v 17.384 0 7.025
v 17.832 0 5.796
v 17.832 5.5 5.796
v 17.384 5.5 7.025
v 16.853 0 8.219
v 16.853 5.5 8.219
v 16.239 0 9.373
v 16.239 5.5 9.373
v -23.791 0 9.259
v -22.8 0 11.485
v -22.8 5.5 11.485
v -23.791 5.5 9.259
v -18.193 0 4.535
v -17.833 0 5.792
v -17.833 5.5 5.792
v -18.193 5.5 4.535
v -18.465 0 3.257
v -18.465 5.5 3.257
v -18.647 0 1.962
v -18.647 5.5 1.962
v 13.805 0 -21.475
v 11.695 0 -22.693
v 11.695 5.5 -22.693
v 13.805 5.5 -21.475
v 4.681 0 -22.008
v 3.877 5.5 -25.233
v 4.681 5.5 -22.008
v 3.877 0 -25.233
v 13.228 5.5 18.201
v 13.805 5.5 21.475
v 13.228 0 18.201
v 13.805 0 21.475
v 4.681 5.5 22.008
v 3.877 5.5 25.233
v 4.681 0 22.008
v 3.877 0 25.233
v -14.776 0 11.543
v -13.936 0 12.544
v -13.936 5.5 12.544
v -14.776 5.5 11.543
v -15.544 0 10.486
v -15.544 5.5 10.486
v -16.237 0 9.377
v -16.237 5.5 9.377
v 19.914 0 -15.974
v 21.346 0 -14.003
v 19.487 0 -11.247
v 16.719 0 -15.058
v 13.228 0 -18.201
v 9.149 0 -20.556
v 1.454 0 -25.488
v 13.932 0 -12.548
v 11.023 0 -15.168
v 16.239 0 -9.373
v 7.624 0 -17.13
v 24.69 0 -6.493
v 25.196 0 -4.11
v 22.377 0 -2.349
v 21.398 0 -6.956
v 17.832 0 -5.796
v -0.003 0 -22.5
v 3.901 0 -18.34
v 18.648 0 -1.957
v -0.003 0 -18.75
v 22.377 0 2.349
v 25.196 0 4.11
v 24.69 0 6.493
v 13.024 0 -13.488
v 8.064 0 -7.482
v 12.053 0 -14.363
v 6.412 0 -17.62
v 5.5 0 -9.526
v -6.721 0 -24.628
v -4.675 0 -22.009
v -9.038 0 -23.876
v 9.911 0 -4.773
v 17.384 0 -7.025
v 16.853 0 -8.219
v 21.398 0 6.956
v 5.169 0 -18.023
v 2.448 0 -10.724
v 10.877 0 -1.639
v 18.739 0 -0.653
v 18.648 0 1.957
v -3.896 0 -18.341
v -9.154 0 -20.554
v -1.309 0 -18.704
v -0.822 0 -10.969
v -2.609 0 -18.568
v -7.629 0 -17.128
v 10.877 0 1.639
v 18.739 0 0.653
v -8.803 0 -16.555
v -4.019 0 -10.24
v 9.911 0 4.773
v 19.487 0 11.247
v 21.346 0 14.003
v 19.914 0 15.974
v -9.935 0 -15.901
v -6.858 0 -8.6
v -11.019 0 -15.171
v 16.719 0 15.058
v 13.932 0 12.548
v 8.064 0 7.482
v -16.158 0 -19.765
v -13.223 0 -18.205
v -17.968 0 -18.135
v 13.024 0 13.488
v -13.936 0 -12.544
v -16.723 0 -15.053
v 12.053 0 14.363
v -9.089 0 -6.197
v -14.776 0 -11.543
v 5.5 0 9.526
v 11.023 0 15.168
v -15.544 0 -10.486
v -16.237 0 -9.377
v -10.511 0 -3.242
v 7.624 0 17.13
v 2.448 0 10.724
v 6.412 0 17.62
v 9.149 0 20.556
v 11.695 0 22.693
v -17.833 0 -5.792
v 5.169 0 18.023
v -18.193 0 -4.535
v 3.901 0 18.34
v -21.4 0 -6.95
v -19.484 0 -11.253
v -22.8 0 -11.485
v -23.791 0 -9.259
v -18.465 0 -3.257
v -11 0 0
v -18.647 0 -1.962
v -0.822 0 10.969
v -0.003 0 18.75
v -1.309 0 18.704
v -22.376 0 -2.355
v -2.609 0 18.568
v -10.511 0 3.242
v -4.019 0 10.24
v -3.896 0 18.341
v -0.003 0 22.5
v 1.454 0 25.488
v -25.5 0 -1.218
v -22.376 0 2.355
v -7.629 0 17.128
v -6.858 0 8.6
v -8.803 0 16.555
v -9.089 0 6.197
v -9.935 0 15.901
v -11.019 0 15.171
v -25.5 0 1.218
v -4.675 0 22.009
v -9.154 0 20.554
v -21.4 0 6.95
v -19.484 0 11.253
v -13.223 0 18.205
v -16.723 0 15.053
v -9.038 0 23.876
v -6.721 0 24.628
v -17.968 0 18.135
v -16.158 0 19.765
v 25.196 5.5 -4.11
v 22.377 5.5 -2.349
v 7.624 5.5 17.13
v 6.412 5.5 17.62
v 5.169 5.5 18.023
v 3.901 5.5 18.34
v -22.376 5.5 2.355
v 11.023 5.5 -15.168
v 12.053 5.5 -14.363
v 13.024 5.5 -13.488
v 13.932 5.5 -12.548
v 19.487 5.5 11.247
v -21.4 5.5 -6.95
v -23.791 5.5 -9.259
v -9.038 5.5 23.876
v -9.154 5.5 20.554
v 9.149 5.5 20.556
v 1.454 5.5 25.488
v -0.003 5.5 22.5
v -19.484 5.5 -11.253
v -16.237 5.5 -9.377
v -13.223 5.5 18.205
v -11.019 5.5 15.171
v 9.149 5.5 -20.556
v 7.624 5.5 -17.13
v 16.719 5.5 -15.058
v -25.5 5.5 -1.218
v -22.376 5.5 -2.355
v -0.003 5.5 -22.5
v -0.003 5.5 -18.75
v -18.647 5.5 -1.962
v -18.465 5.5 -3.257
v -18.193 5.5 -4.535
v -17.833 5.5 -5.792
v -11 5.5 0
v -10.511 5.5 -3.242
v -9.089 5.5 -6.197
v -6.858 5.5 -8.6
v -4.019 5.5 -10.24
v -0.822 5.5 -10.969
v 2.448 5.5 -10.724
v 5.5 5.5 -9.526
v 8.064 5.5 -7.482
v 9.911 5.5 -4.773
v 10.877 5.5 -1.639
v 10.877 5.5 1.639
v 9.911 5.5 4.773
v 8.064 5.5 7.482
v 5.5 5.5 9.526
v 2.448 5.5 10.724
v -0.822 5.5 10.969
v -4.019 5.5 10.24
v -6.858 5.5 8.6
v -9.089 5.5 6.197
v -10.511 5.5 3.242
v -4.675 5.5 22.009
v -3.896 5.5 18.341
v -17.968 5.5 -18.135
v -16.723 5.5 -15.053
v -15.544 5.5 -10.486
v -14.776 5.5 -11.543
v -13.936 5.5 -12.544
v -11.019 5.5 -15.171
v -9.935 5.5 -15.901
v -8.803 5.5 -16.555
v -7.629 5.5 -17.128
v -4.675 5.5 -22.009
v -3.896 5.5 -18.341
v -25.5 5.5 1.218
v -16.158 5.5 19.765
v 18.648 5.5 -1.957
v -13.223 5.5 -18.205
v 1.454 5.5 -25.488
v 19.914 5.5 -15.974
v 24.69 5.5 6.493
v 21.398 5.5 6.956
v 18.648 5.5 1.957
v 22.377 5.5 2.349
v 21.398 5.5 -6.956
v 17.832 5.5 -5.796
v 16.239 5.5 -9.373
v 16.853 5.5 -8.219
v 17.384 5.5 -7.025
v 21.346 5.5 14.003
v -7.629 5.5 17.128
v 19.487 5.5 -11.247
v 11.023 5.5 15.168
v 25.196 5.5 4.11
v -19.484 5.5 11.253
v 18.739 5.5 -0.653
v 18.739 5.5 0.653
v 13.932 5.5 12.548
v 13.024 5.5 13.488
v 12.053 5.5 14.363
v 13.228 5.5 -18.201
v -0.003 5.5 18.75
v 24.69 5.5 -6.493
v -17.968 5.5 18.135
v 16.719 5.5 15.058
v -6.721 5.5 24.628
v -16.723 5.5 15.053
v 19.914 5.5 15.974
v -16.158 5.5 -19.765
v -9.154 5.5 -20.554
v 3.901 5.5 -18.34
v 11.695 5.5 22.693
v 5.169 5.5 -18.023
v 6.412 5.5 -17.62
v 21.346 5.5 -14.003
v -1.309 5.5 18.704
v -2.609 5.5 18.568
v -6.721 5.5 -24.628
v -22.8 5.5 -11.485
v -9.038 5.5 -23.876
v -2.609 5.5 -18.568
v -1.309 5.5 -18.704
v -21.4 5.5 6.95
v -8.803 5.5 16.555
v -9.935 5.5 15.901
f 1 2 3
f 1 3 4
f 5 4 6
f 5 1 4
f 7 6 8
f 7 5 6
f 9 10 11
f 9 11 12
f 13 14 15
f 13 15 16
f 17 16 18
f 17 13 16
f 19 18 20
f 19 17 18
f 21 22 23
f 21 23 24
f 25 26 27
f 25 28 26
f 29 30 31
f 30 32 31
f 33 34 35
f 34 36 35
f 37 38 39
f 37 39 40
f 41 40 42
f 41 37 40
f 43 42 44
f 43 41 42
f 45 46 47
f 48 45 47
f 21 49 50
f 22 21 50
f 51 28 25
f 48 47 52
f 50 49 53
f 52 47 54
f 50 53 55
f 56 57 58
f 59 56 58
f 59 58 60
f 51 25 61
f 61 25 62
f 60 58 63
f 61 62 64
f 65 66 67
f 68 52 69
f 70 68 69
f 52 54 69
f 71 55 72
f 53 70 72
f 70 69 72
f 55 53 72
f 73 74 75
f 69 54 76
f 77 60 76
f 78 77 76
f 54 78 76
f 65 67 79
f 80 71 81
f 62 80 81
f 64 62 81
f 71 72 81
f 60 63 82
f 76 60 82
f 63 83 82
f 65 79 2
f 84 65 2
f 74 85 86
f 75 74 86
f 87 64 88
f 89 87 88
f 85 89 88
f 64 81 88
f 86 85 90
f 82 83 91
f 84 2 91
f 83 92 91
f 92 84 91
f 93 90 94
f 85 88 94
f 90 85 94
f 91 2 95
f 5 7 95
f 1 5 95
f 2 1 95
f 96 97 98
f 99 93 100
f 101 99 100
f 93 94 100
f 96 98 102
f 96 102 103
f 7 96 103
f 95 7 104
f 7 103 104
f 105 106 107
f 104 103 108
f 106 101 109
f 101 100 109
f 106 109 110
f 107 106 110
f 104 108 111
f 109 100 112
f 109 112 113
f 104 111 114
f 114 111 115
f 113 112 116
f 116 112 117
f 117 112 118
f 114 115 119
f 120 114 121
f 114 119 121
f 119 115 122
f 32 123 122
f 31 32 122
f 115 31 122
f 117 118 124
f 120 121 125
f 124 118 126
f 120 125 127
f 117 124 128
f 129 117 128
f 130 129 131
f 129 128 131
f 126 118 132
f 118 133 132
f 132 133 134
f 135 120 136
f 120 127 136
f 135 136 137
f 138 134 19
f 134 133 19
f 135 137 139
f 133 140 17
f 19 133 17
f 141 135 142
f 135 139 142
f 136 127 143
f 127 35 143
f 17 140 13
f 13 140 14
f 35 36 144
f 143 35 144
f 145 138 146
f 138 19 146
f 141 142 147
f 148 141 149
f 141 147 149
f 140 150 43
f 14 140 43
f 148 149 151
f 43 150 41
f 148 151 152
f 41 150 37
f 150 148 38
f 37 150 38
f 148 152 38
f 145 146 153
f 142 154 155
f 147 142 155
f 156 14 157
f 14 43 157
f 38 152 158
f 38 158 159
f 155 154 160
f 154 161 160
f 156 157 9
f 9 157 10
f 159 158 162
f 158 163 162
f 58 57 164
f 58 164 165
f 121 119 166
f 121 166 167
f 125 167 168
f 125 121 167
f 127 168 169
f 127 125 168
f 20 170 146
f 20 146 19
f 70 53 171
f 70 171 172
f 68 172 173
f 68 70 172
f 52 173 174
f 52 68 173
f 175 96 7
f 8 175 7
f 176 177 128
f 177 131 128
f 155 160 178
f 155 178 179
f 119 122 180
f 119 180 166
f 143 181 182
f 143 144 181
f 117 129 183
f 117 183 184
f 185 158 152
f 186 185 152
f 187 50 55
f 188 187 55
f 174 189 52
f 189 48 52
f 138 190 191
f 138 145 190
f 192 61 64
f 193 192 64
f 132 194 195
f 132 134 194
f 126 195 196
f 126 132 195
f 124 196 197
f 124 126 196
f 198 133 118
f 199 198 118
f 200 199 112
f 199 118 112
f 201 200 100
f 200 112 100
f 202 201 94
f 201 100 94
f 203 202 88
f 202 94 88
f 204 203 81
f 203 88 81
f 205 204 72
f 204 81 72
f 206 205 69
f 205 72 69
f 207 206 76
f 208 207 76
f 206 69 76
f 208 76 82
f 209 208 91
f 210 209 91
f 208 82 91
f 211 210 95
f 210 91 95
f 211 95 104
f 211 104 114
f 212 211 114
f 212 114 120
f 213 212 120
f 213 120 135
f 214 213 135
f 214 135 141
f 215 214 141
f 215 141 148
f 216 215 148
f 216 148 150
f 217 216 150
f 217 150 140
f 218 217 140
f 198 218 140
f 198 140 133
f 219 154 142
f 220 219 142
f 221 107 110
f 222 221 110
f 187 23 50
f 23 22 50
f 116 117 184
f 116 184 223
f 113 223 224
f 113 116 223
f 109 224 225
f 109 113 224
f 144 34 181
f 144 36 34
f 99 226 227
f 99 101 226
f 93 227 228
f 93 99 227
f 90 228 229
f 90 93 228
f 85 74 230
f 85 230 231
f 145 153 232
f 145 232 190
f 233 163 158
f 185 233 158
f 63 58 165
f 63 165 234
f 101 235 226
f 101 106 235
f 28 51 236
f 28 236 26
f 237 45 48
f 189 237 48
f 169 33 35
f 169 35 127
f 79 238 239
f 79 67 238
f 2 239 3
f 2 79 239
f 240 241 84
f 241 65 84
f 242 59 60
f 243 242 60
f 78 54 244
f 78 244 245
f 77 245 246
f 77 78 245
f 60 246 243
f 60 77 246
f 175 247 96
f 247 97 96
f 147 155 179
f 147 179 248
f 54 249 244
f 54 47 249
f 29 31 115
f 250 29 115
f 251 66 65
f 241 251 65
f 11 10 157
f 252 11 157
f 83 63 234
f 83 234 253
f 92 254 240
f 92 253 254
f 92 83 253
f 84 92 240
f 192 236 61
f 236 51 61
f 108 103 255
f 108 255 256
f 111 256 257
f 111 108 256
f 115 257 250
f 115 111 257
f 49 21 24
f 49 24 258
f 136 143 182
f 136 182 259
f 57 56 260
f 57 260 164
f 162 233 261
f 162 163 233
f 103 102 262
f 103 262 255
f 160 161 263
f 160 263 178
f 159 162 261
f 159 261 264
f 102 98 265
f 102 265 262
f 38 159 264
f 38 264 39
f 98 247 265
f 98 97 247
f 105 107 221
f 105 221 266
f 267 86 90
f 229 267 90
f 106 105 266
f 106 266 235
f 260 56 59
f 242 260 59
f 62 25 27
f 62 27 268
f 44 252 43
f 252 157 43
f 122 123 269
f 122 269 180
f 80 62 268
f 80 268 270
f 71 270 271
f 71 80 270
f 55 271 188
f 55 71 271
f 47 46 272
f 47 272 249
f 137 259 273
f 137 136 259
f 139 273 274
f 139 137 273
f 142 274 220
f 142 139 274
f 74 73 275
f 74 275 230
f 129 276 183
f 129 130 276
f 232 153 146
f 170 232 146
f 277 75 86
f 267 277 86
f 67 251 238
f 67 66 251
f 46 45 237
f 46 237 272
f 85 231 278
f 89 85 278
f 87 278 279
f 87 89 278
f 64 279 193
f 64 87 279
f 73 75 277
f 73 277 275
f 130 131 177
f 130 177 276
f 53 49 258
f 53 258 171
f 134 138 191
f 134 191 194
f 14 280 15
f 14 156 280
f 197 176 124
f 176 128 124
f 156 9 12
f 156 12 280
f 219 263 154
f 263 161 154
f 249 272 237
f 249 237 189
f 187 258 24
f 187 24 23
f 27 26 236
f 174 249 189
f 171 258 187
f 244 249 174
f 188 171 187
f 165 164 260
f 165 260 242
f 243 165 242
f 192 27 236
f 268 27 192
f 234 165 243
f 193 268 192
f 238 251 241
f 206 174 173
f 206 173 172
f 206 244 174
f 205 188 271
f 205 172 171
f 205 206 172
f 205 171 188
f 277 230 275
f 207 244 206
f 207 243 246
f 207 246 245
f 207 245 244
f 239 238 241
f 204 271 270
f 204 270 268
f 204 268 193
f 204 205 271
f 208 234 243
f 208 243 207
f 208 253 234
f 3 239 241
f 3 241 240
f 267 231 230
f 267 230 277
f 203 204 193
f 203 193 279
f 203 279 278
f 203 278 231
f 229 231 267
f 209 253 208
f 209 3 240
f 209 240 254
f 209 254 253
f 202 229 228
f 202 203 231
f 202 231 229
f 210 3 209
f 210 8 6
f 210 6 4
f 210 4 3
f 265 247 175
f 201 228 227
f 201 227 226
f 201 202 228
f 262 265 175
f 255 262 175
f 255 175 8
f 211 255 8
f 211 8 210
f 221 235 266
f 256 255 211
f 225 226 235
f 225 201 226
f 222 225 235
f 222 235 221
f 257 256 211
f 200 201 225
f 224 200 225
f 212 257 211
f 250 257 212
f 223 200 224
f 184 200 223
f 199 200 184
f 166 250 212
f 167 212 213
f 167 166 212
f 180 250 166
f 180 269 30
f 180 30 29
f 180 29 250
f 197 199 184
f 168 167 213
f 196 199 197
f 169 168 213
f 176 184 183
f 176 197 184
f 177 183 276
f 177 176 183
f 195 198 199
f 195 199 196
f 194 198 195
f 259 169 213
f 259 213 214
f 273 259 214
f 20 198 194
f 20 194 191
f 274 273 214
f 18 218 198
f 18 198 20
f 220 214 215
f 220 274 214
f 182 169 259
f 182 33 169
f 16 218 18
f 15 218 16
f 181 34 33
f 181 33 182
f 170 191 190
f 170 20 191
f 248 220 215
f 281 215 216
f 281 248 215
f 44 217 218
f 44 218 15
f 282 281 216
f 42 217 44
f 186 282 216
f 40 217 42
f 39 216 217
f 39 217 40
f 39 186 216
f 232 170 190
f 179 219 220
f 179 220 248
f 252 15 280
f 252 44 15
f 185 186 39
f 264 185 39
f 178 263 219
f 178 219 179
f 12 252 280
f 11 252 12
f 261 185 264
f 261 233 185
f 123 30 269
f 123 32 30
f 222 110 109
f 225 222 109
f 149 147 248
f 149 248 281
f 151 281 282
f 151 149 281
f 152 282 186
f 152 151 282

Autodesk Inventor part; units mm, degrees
ref_plane "YZ Plane" through (0, 0, 0) normal (1, 0, 0) x (0, 1, 0)
ref_plane "XZ Plane" through (0, 0, 0) normal (0, 1, 0) x (-1, 0, 0)
ref_plane "XY Plane" through (0, 0, 0) normal (0, 0, 1) x (1, 0, 0)
sketch "スケッチ1" plane through (0, 0, 0) normal (0, 1, 0) x (-1, 0, 0)
  circle A0 centre (0, 0) radius 22.5 construction
  circle A1 centre (0, 0) radius 25.5 construction
  line L0 (25.5, 1.2181) -> (25.5, -1.2181)
  line L1 (25.5, 1.2181) -> (22.3764, 2.355)
  line L2 (25.5, -1.2181) -> (22.3764, -2.355)
  line L3 (35.7, 0) -> (-35.7, 0) projected
  circle A2 centre (0, 0) radius 18.75
  line L4 (22.3764, -2.355) -> (18.647, -1.9625)
  line L5 (22.3764, 2.355) -> (18.647, 1.9625)
  line L6 (19.484, 11.2527) -> (16.2367, 9.3773)
  line L7 (22.8, 11.4846) -> (19.484, 11.2527)
  line L8 (22.8, 11.4846) -> (23.7909, 9.259)
  line L9 (23.7909, 9.259) -> (21.3997, 6.9499)
  line L10 (21.3997, 6.9499) -> (17.8331, 5.7916)
  line L11 (13.2226, 18.2047) -> (11.0189, 15.1706)
  line L12 (16.1576, 19.7653) -> (13.2226, 18.2047)
  line L13 (16.1576, 19.7653) -> (17.9681, 18.1351)
  line L14 (17.9681, 18.1351) -> (16.7229, 15.0531)
  line L15 (16.7229, 15.0531) -> (13.9357, 12.5443)
  line L16 (4.675, 22.009) -> (3.8958, 18.3408)
  line L17 (6.7214, 24.6284) -> (4.675, 22.009)
  line L18 (6.7214, 24.6284) -> (9.0384, 23.8755)
  line L19 (9.0384, 23.8755) -> (9.1544, 20.5535)
  line L20 (9.1544, 20.5535) -> (7.6287, 17.1279)
  line L21 (-4.6811, 22.0077) -> (-3.9009, 18.3397)
  line L22 (-3.8769, 25.233) -> (-4.6811, 22.0077)
  line L23 (-3.8769, 25.233) -> (-1.454, 25.4876)
  line L24 (-1.454, 25.4876) -> (0.0031, 22.5)
  line L25 (0.0031, 22.5) -> (0.0026, 18.75)
  line L26 (-13.2277, 18.201) -> (-11.0231, 15.1675)
  line L27 (-13.8049, 21.4746) -> (-13.2277, 18.201)
  line L28 (-13.8049, 21.4746) -> (-11.6951, 22.6927)
  line L29 (-11.6951, 22.6927) -> (-9.1487, 20.556)
  line L30 (-9.1487, 20.556) -> (-7.6239, 17.13)
  line L31 (-19.4871, 11.2473) -> (-16.2393, 9.3727)
  line L32 (-21.3459, 14.0031) -> (-19.4871, 11.2473)
  line L33 (-21.3459, 14.0031) -> (-19.9139, 15.974)
  line L34 (-19.9139, 15.974) -> (-16.7187, 15.0578)
  line L35 (-16.7187, 15.0578) -> (-13.9322, 12.5481)
  line L36 (-22.3771, 2.3488) -> (-18.6476, 1.9573)
  line L37 (-25.196, 4.1103) -> (-22.3771, 2.3488)
  line L38 (-25.196, 4.1103) -> (-24.6895, 6.4932)
  line L39 (-24.6895, 6.4932) -> (-21.3978, 6.9559)
  line L40 (-21.3978, 6.9559) -> (-17.8315, 5.7965)
  line L41 (-21.3978, -6.9559) -> (-17.8315, -5.7965)
  line L42 (-24.6895, -6.4932) -> (-21.3978, -6.9559)
  line L43 (-24.6895, -6.4932) -> (-25.196, -4.1103)
  line L44 (-25.196, -4.1103) -> (-22.3771, -2.3488)
  line L45 (-22.3771, -2.3488) -> (-18.6476, -1.9573)
  line L46 (-16.7187, -15.0578) -> (-13.9322, -12.5481)
  line L47 (-19.9139, -15.974) -> (-16.7187, -15.0578)
  line L48 (-19.9139, -15.974) -> (-21.3459, -14.0031)
  line L49 (-21.3459, -14.0031) -> (-19.4871, -11.2473)
  line L50 (-19.4871, -11.2473) -> (-16.2393, -9.3727)
  line L51 (-9.1487, -20.556) -> (-7.6239, -17.13)
  line L52 (-11.6951, -22.6927) -> (-9.1487, -20.556)
  line L53 (-11.6951, -22.6927) -> (-13.8049, -21.4746)
  line L54 (-13.8049, -21.4746) -> (-13.2277, -18.201)
  line L55 (-13.2277, -18.201) -> (-11.0231, -15.1675)
  line L56 (0.0031, -22.5) -> (0.0026, -18.75)
  line L57 (-1.454, -25.4876) -> (0.0031, -22.5)
  line L58 (-1.454, -25.4876) -> (-3.8769, -25.233)
  line L59 (-3.8769, -25.233) -> (-4.6811, -22.0077)
  line L60 (-4.6811, -22.0077) -> (-3.9009, -18.3397)
  line L61 (9.1544, -20.5535) -> (7.6287, -17.1279)
  line L62 (9.0384, -23.8755) -> (9.1544, -20.5535)
  line L63 (9.0384, -23.8755) -> (6.7214, -24.6284)
  line L64 (6.7214, -24.6284) -> (4.675, -22.009)
  line L65 (4.675, -22.009) -> (3.8958, -18.3408)
  line L66 (16.7229, -15.0531) -> (13.9357, -12.5443)
  line L67 (17.9681, -18.1351) -> (16.7229, -15.0531)
  line L68 (17.9681, -18.1351) -> (16.1576, -19.7653)
  line L69 (16.1576, -19.7653) -> (13.2226, -18.2047)
  line L70 (13.2226, -18.2047) -> (11.0189, -15.1706)
  line L71 (21.3997, -6.9499) -> (17.8331, -5.7916)
  line L72 (23.7909, -9.259) -> (21.3997, -6.9499)
  line L73 (23.7909, -9.259) -> (22.8, -11.4846)
  line L74 (22.8, -11.4846) -> (19.484, -11.2527)
  line L75 (19.484, -11.2527) -> (16.2367, -9.3773)
  circle A3 centre (0, 0) radius 11
  point P0 (25.5, 0)
  point P1 (23.2954, 10.3718)
  point P2 (17.0628, 18.9502)
  point P3 (7.8799, 24.2519)
  point P4 (-2.6655, 25.3603)
  point P5 (-12.75, 22.0836)
  point P6 (-20.6299, 14.9885)
  point P7 (-24.9428, 5.3017)
  point P8 (-24.9428, -5.3017)
  point P9 (-20.6299, -14.9885)
  point P10 (-12.75, -22.0836)
  point P11 (-2.6655, -25.3603)
  point P12 (7.8799, -24.2519)
  point P13 (17.0628, -18.9502)
  point P14 (23.2954, -10.3718)
  point P15 (17.8331, 5.7916)
  point P16 (16.2367, 9.3773)
  point P17 (13.9357, 12.5443)
  point P18 (11.0189, 15.1706)
  point P19 (7.6287, 17.1279)
  point P20 (3.8958, 18.3408)
  point P21 (0.0026, 18.75)
  point P22 (-3.9009, 18.3397)
  point P23 (-7.6239, 17.13)
  point P24 (-11.0231, 15.1675)
  point P25 (-13.9322, 12.5481)
  point P26 (-16.2393, 9.3727)
  point P27 (-17.8315, 5.7965)
  point P28 (-18.6476, 1.9573)
  point P29 (-18.6476, -1.9573)
  point P30 (-17.8315, -5.7965)
  point P31 (-16.2393, -9.3727)
  point P32 (-13.9322, -12.5481)
  point P33 (-11.0231, -15.1675)
  point P34 (-7.6239, -17.13)
  point P35 (-3.9009, -18.3397)
  point P36 (0.0026, -18.75)
  point P37 (3.8958, -18.3408)
  point P38 (7.6287, -17.1279)
  point P39 (11.0189, -15.1706)
  point P40 (13.9357, -12.5443)
  point P41 (16.2367, -9.3773)
  point P42 (17.8331, -5.7916)
  dimension "d5" = 37.5
  dimension "d0" = 45
  dimension "d1" = 51
  dimension "d3" = 20
  dimension "d4" = 20
  dimension "d14" = 4.71
  dimension "d18" = 360
  dimension "d23" = 22
extrude "押し出し1" add sketch "スケッチ1" along normal blind 5.5 contours L0 L3 A2 L5 L1 | L0 L2 L4 A2 L3 | A2 L3 A3 | L3 A3 A2 | A2 L6 L7 L8 L9 L10 | L71 L72 L73 L74 L75 A2 | A2 L11 L12 L13 L14 L15 | L36 L37 L38 L39 L40 A2 | A2 L41 L42 L43 L44 L45 | L66 L67 L68 L69 L70 A2 | A2 L16 L17 L18 L19 L20 | L31 L32 L33 L34 L35 A2 | A2 L46 L47 L48 L49 L50 | L61 L62 L63 L64 L65 A2 | A2 L21 L22 L23 L24 L25 | L26 L27 L28 L29 L30 A2 | A2 L51 L52 L53 L54 L55 | L56 L57 L58 L59 L60 A2
properties part number "M3_15"
